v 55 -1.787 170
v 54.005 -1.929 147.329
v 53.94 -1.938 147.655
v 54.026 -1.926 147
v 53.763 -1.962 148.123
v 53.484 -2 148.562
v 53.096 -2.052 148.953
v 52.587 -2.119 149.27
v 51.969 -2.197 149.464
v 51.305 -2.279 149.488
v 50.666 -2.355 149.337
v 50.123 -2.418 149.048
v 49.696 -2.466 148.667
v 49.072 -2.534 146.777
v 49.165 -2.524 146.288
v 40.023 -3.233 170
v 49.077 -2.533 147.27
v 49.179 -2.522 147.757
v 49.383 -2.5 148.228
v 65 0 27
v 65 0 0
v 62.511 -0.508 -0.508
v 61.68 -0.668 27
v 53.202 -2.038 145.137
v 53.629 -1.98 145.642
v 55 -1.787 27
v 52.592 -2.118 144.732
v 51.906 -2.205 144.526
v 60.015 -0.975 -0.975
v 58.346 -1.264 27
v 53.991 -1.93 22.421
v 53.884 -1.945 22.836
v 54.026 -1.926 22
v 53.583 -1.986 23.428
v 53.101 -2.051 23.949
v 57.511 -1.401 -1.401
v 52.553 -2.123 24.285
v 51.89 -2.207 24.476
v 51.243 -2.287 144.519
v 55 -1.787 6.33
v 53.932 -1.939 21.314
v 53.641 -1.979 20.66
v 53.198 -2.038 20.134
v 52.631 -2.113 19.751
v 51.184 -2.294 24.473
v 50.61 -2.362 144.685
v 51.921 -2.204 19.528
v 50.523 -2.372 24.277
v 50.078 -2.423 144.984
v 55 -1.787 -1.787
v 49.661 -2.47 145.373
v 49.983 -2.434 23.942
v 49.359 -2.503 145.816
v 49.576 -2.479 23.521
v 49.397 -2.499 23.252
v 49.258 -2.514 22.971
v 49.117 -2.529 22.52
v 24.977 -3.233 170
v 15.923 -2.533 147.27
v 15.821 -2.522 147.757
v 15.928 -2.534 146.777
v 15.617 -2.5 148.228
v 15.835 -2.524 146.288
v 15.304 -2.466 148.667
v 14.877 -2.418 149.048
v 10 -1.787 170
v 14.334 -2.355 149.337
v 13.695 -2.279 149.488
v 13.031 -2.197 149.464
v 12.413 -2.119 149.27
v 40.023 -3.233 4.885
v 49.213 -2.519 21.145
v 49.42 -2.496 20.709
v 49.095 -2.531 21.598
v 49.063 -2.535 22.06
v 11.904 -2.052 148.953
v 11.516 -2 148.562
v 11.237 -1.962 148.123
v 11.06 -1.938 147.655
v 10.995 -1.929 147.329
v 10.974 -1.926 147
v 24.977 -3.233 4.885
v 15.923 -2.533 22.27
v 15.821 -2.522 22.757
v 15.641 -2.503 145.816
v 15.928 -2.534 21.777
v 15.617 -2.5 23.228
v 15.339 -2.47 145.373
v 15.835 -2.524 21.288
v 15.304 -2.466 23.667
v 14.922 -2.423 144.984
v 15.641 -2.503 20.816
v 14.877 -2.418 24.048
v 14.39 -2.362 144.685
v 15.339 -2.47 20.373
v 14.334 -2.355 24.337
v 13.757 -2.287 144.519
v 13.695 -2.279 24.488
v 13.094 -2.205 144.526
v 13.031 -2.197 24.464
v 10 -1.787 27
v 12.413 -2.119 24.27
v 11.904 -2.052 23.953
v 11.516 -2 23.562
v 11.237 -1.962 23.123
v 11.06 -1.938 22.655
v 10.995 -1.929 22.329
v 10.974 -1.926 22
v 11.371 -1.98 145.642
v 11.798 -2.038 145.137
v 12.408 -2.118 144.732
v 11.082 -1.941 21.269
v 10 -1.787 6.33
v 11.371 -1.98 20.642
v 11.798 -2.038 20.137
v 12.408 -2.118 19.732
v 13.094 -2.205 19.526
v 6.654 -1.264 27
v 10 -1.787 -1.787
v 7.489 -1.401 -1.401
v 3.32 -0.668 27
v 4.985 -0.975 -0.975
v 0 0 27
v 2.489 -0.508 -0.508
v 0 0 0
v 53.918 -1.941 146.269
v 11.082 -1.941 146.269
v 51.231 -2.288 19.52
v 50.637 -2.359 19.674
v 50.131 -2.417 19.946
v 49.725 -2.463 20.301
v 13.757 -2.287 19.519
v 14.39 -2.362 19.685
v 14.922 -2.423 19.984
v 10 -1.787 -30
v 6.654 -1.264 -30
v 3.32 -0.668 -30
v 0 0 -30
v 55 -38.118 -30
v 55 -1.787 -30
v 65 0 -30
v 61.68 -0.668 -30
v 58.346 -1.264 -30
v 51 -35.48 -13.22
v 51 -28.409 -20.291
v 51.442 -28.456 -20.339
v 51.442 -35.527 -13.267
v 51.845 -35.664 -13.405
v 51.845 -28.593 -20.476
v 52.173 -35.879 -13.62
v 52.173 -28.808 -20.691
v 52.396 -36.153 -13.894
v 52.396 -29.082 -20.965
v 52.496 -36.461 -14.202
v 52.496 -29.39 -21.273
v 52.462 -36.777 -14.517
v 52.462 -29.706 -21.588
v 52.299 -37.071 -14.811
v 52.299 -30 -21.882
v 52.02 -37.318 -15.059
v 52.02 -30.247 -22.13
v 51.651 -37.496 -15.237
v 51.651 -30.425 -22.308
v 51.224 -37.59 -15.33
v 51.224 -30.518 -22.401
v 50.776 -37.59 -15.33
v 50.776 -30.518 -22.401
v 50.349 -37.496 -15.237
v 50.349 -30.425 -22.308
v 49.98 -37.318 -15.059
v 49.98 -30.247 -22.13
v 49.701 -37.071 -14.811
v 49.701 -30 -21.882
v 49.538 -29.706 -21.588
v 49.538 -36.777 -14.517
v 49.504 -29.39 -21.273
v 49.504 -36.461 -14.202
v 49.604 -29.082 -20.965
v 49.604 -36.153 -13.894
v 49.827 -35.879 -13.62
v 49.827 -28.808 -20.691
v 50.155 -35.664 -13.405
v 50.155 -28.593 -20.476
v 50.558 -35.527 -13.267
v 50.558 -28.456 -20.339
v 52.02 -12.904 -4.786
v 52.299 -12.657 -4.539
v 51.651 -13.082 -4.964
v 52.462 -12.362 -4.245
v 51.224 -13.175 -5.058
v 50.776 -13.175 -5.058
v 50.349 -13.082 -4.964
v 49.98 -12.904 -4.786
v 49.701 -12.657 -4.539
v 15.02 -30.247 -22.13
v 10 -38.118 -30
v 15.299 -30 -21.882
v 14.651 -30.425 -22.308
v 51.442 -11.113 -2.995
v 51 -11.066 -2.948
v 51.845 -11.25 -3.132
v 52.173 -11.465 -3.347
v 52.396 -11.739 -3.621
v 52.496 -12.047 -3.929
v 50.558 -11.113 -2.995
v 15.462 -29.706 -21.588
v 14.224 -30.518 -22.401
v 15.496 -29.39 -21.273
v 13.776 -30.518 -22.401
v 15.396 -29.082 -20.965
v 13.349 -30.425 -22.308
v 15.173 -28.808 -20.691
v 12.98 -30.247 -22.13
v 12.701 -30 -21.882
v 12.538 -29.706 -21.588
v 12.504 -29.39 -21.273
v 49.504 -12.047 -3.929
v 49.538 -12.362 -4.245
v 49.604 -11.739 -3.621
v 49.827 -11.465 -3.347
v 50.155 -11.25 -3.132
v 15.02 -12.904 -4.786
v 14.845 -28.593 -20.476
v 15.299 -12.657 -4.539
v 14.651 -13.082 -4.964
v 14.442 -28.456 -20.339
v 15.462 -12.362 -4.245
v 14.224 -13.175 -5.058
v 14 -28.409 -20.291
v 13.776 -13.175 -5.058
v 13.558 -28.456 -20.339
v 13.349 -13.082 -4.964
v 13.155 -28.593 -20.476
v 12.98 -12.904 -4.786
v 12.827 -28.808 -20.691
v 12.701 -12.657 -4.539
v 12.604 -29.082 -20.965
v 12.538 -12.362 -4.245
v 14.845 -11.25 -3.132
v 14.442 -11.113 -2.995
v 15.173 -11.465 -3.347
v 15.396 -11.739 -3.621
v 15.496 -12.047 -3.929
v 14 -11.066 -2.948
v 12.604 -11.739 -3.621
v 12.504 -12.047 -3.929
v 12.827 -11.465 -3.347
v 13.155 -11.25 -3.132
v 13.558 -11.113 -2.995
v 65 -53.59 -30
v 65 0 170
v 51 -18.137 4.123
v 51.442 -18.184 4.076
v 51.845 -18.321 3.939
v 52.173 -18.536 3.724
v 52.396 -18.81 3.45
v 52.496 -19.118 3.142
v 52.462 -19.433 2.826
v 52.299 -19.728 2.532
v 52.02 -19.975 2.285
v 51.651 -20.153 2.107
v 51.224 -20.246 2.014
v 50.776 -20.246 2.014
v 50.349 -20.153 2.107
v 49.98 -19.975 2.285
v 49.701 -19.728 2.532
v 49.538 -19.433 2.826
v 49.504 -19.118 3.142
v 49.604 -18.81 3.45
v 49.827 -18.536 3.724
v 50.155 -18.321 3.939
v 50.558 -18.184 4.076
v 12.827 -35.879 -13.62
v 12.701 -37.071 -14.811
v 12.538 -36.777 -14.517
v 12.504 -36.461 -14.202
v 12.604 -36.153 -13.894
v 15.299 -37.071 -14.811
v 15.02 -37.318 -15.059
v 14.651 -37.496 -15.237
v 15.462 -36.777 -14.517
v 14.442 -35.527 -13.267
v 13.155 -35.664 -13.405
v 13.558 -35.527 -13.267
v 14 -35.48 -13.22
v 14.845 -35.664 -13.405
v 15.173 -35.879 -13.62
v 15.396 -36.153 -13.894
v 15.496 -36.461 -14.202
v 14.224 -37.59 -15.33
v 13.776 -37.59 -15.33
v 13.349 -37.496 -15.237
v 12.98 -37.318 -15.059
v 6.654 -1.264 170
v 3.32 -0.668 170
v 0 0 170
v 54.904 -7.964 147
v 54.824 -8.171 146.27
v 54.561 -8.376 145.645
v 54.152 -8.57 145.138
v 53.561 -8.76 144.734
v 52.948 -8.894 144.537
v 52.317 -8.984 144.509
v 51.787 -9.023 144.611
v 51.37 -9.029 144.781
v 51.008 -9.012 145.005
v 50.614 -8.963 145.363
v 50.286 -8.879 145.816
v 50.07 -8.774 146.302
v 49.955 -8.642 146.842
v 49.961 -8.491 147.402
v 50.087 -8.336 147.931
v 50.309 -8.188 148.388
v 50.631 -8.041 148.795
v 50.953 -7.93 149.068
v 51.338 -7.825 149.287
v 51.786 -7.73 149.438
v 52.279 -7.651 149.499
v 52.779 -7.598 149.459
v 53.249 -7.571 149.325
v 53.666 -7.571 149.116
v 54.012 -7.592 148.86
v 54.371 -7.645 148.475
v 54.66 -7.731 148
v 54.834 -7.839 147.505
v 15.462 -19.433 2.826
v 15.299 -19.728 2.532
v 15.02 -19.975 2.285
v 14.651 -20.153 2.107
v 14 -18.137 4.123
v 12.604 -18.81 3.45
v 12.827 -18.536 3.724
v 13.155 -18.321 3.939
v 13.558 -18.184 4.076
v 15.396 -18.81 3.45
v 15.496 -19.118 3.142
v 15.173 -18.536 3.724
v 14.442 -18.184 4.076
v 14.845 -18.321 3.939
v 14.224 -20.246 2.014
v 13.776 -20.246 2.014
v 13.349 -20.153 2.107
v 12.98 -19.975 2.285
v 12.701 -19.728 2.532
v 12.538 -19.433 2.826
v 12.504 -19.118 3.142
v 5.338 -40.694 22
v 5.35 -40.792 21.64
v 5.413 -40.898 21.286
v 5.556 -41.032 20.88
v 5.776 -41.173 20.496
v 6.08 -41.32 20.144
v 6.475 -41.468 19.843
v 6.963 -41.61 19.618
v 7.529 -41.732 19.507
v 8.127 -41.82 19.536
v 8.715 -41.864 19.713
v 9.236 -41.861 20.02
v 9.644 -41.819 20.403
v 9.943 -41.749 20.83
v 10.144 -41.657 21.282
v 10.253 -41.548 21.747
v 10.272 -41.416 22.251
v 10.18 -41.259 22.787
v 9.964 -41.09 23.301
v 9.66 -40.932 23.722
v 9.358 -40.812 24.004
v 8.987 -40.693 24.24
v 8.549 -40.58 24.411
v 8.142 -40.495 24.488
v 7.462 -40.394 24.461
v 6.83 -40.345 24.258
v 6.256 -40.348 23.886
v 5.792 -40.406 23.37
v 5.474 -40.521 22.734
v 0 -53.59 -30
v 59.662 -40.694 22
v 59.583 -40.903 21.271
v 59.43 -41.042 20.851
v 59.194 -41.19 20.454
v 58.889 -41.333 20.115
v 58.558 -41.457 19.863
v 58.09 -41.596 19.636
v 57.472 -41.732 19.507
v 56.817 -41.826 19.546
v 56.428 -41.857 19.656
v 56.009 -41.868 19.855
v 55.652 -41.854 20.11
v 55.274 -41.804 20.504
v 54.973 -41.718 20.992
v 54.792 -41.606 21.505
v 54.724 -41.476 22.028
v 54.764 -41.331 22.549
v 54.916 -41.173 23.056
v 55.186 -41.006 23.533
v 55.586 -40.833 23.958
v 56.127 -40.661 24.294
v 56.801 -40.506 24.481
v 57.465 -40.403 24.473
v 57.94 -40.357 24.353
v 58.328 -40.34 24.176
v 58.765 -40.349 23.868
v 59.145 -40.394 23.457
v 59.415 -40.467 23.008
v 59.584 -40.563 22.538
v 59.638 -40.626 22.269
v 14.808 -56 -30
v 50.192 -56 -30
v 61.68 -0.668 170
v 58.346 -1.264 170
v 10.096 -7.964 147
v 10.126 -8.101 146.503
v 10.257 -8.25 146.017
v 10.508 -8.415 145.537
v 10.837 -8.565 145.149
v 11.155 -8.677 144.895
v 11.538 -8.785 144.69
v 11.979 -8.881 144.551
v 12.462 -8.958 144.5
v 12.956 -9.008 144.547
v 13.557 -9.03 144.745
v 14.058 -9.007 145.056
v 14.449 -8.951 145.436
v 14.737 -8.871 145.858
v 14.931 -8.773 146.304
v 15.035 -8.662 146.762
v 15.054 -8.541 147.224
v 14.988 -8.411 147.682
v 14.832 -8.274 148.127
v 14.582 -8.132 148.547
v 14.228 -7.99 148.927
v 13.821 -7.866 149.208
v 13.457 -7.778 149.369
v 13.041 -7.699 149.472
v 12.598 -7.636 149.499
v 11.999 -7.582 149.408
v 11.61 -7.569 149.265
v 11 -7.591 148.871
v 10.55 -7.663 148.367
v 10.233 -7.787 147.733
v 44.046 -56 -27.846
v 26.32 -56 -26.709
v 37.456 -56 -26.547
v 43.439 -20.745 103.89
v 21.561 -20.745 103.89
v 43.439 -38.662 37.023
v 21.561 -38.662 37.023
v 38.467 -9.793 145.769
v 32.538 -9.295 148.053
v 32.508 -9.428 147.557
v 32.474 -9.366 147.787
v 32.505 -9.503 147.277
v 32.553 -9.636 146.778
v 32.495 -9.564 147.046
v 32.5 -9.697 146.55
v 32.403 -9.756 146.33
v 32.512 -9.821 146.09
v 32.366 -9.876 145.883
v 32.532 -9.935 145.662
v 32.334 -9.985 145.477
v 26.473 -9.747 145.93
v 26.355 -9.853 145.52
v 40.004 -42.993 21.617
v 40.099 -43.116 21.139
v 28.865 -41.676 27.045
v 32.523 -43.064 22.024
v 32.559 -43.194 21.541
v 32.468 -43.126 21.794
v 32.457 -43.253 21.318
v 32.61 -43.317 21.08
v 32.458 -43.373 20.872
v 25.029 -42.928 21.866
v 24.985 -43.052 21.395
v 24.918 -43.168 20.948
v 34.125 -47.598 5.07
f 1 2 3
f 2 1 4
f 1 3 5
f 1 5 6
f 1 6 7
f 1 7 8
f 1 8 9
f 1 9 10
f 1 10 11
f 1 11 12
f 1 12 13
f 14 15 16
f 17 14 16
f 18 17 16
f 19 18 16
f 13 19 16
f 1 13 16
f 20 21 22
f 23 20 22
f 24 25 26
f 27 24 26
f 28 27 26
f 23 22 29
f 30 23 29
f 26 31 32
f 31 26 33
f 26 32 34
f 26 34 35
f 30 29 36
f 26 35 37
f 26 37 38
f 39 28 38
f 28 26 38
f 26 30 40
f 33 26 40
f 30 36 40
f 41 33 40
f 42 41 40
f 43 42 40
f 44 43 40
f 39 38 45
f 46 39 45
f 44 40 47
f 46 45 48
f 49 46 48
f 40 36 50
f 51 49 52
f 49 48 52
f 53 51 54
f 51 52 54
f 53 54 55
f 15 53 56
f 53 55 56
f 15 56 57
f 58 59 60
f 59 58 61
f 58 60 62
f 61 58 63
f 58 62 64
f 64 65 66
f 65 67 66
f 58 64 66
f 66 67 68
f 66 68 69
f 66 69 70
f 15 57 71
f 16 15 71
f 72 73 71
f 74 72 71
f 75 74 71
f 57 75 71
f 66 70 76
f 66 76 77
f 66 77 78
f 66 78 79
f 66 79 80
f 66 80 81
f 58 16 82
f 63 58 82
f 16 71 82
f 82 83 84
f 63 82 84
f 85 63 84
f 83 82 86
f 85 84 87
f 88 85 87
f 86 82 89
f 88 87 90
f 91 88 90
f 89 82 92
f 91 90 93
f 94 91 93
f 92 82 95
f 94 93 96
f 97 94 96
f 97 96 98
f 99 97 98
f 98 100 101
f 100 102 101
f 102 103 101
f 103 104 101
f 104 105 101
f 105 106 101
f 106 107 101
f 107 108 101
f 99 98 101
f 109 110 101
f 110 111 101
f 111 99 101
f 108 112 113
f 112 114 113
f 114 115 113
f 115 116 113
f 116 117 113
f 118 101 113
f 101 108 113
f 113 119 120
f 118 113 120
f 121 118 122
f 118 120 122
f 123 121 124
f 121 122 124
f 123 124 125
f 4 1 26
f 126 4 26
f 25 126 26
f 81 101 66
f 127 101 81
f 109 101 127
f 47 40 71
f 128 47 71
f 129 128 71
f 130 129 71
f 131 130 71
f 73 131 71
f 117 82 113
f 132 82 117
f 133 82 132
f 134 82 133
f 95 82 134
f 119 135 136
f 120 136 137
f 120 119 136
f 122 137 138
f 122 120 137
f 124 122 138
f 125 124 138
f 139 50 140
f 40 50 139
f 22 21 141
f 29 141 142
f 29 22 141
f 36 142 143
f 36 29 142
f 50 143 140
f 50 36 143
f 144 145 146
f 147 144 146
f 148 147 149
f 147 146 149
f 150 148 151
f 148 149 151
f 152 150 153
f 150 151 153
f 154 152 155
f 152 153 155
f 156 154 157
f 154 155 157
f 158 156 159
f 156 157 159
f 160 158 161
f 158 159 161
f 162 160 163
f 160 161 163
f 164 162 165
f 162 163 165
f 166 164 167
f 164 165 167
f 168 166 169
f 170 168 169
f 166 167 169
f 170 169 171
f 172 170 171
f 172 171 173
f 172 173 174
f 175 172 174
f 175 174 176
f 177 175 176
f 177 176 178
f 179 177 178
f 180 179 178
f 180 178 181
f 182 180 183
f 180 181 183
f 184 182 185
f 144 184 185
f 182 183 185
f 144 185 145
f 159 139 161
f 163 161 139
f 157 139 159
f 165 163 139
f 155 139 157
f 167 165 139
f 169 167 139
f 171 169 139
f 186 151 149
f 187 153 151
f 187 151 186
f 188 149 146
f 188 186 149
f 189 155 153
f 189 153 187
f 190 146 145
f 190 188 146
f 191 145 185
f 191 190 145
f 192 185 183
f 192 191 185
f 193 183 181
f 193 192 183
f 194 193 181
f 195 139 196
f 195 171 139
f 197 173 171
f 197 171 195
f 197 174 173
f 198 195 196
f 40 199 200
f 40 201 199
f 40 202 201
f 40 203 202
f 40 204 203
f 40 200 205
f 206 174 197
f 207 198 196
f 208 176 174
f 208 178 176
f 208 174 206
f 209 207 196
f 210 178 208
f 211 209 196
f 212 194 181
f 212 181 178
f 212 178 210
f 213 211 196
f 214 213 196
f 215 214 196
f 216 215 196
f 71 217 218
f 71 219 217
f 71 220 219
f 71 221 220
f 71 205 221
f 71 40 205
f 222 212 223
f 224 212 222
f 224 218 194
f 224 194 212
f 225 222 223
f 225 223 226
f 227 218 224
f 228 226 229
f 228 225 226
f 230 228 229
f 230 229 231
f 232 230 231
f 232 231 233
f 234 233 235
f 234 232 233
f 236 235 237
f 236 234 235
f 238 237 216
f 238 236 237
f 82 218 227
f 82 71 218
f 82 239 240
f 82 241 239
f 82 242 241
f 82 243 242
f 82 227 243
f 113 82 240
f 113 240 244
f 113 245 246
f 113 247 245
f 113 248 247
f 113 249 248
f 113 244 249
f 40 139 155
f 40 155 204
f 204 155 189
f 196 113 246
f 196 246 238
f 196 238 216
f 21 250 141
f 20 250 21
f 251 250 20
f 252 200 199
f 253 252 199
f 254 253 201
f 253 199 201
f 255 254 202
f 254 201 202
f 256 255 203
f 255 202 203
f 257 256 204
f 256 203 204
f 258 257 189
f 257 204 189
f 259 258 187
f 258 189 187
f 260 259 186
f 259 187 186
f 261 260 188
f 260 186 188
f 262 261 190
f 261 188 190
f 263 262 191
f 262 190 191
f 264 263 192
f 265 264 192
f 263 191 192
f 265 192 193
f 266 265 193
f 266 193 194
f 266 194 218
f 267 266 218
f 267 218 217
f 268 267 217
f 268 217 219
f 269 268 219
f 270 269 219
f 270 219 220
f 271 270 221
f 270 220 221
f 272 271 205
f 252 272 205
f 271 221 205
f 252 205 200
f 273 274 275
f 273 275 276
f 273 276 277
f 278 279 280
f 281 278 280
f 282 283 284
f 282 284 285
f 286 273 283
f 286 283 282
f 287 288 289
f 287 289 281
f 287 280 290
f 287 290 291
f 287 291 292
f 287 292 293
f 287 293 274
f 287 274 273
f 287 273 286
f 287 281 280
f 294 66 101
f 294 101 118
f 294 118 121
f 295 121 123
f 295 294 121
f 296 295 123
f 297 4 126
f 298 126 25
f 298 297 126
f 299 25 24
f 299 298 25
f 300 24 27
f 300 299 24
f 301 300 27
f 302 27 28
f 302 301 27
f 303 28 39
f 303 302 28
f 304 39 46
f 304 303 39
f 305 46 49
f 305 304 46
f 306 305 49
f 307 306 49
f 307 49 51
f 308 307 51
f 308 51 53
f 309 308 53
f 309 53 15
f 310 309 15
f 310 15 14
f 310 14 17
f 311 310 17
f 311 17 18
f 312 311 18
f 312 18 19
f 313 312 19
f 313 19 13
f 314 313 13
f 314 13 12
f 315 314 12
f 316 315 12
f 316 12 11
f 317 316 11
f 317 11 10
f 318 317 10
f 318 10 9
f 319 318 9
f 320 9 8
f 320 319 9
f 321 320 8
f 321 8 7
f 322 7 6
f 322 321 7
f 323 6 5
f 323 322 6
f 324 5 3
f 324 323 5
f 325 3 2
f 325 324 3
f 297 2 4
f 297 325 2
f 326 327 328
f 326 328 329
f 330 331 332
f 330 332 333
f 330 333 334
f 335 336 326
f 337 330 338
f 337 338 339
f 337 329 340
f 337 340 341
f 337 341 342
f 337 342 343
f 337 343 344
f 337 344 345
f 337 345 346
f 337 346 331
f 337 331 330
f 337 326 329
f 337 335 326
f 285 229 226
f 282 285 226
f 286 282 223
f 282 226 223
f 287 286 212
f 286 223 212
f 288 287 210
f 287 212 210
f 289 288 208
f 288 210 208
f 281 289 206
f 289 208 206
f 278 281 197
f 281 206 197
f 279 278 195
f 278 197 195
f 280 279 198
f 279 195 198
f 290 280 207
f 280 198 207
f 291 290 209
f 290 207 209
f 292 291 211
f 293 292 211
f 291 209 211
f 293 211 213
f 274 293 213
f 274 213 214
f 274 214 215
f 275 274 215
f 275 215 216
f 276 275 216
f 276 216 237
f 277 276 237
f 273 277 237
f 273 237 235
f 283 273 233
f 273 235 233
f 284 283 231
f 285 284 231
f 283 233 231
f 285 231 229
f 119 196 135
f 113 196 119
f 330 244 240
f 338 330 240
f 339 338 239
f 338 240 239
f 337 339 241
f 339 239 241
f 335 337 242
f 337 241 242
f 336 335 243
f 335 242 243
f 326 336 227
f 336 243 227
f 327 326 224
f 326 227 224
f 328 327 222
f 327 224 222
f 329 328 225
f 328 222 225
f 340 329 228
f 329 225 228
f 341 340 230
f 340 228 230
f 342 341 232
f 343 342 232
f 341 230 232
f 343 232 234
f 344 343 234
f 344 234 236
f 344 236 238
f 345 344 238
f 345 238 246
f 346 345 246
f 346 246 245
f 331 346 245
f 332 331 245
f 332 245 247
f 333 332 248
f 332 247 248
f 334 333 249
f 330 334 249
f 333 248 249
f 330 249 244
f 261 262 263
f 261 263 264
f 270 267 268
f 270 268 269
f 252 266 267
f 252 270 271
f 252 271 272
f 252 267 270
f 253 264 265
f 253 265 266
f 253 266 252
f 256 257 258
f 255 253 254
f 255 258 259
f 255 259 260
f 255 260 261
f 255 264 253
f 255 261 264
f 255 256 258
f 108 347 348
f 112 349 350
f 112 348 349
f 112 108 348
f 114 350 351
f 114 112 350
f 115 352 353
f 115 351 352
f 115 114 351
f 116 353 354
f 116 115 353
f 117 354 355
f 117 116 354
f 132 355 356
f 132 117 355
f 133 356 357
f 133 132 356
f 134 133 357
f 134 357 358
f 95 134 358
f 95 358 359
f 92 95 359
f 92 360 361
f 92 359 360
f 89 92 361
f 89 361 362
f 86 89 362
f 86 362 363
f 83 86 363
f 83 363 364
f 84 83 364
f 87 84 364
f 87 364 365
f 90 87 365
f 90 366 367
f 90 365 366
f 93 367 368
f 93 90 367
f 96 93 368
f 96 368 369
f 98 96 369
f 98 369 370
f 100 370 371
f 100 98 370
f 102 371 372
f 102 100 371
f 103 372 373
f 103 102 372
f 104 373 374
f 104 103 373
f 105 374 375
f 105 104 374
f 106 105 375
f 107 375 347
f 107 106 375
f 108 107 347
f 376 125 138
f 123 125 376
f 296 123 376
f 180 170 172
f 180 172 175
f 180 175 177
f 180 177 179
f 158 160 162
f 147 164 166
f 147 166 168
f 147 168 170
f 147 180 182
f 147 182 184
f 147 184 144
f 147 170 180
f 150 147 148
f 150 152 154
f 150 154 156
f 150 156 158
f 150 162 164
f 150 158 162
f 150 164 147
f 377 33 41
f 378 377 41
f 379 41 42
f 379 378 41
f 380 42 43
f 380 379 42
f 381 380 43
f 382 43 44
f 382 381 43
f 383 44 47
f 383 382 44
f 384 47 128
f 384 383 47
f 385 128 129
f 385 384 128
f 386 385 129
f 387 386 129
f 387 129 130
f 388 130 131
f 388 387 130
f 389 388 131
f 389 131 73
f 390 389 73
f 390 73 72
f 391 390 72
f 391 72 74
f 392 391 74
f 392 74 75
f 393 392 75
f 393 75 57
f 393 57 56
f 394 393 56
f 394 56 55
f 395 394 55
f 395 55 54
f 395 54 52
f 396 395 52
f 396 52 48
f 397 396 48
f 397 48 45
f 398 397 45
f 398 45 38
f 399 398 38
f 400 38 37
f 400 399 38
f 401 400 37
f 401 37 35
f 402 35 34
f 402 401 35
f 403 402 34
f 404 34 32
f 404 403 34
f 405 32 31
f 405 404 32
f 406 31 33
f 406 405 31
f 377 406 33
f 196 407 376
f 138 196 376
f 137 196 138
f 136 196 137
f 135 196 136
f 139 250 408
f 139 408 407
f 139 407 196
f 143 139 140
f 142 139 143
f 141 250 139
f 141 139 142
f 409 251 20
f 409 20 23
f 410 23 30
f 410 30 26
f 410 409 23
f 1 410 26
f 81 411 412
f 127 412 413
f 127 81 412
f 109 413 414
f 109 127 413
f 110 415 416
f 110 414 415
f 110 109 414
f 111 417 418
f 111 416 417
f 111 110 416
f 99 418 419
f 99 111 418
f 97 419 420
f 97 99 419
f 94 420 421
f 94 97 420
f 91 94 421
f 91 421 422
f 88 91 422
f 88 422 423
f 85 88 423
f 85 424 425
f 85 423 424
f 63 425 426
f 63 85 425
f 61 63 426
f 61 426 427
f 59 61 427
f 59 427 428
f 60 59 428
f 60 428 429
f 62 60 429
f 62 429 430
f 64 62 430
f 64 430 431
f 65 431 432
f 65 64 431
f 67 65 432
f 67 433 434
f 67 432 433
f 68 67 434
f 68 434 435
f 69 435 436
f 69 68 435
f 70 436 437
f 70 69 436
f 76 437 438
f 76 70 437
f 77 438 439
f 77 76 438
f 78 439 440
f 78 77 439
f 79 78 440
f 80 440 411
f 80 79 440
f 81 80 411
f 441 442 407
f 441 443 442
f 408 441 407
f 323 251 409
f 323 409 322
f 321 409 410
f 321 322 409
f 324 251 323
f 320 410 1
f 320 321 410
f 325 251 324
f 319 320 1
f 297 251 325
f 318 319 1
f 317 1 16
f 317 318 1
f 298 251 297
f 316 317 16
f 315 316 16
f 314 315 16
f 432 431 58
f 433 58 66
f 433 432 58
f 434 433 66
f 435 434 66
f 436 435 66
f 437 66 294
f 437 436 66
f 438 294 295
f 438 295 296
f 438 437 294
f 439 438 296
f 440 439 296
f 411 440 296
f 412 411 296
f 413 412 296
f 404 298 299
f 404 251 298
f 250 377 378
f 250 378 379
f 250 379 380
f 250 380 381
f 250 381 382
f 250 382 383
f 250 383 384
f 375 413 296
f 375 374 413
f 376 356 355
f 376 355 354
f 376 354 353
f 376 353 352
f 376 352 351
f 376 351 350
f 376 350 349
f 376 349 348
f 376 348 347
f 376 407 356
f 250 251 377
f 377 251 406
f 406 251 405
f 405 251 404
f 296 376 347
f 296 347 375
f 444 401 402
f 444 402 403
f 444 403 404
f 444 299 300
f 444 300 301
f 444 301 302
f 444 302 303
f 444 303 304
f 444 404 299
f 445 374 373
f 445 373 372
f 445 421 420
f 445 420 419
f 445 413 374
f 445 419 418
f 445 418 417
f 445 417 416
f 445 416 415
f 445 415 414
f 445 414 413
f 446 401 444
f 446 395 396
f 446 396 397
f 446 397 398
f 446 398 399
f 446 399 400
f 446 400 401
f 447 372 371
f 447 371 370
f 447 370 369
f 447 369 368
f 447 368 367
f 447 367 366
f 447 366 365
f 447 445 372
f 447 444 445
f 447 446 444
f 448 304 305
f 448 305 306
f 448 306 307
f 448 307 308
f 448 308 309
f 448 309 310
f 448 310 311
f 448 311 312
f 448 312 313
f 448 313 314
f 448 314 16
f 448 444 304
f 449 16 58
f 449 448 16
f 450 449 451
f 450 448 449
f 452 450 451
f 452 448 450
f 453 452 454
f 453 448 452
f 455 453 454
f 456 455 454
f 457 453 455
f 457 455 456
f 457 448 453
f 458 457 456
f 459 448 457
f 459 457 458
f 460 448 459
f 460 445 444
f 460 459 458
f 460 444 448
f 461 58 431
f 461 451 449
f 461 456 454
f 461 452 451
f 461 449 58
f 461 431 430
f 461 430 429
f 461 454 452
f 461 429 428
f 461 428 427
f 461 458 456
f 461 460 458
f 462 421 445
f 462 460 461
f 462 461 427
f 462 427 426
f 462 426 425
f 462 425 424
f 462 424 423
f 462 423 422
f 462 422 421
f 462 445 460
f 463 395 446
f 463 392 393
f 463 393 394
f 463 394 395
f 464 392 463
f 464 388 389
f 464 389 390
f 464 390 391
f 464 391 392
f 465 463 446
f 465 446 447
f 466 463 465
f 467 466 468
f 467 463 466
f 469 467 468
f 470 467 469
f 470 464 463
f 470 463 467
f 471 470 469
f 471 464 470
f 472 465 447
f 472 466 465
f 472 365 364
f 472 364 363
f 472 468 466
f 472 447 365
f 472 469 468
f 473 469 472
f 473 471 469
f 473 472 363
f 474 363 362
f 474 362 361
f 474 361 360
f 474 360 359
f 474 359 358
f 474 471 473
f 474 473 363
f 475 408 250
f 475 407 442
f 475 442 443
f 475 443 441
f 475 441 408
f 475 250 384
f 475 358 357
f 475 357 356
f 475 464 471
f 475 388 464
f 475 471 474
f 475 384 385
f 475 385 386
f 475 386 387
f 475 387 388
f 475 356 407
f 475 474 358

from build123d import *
from build123d.topology import SkipClean

# Parameters (mm, degrees)
BOSS_EXTRUDE1_DEPTH     = 27
BOSS_EXTRUDE2_DEPTH     = 65
CUT_EXTRUDE1_DEPTH      = 91.890043459
FILLET1_R               = 1
BOSS_EXTRUDE3_REACH     = 104.243
CUT_EXTRUDE2_REACH      = 104.243
BOSS_EXTRUDE4_REACH     = 92.026
BOSS_EXTRUDE5_DEPTH     = 65
SKETCH14_R              = 1.5
CUT_EXTRUDE7_DEPTH      = 5
CUT_EXTRUDE9_DEPTH      = 105.630301538
CUT_EXTRUDE9_DEPTH_BACK = 105.630301538
SKETCH15_W              = 45
SKETCH15_H              = 5.74
SKETCH16_R              = 1.5
CUT_EXTRUDE10_DEPTH     = 10
FILLET4_R               = 23
BOSS_EXTRUDE7_REACH     = 219.626
CUT_EXTRUDE5_DEPTH      = 184.620949427
CUT_EXTRUDE5_DEPTH_BACK = 184.620949427
SKETCH11_R              = 2.5
CUT_EXTRUDE6_DEPTH      = 186.847147779
CUT_EXTRUDE6_DEPTH_BACK = 186.847147779
SKETCH12_R              = 2.5
CUT_SWEEP1_START        = -43.471641414
CUT_SWEEP1_DEPTH        = 207.679031883


# Read off the part's stored shape, not the designer's step: Cut-Sweep1
with BuildPart() as part:
    # Sketch1 → Boss-Extrude1 (new body)
    with BuildSketch(Plane.XY):
        with BuildLine():
            Line((0, 0), (0, -26))
            ThreePointArc((0, -26), (32.5, -29.41402025), (65, -26))
            Line((65, -26), (65, 0))
            ThreePointArc((65, 0), (32.5, -3.41402025), (0, 0))
        make_face()
    extrude(amount=BOSS_EXTRUDE1_DEPTH)

    # Sketch4 → Boss-Extrude2 (add)
    with BuildSketch(Plane(origin=(65, 0, 0), x_dir=(0, 0, -1), z_dir=(1, 0, 0))):
        Polygon((0, -26), (30, -56), (30, -30), (0, 0), align=None)
    extrude(amount=-BOSS_EXTRUDE2_DEPTH)

    # Sketch5 → Cut-Extrude1 (cut, through all)
    with BuildSketch(Plane.XY):
        with BuildLine():
            Line((65, 0), (0, 0))
            ThreePointArc((0, 0), (32.5, -3.41402025), (65, 0))
        make_face()
    extrude(amount=-CUT_EXTRUDE1_DEPTH, mode=Mode.SUBTRACT)

    # Fillet1
    fillet1_edges = [part.edges().sort_by_distance(p)[0] for p in [
        (32.5, -56, -30),
    ]]
    fillet(fillet1_edges, radius=FILLET1_R)

    # Boss-Extrude3: up to this face of the body (flat: up to its plane)
    boss_extrude3_end = Plane(part.part.faces().sort_by_distance((32.5, -41.792893219, -30))[0])
    # Sketch6 → Boss-Extrude3 (add, up to the picked face)
    with BuildSketch(Plane.XY.offset(27), mode=Mode.PRIVATE) as boss_extrude3_sk1:
        with BuildLine():
            ThreePointArc((0, -26), (4.985486693, -26.974767058), (10, -27.787112227))
            Line((10, -27.787112227), (10, -1.787112227))
            ThreePointArc((10, -1.787112227), (4.985486693, -0.974767058), (0, 0))
            Line((0, 0), (0, -26))
        make_face()
    boss_extrude3_tool1 = split(extrude(boss_extrude3_sk1.sketch, amount=-BOSS_EXTRUDE3_REACH, mode=Mode.PRIVATE), bisect_by=boss_extrude3_end, keep=Keep.BOTH, mode=Mode.PRIVATE)
    # Sketch6 → Boss-Extrude3 (add, up to the picked face)
    with BuildSketch(Plane.XY.offset(27), mode=Mode.PRIVATE) as boss_extrude3_sk2:
        with BuildLine():
            Line((55, -1.787112227), (55, -27.787112227))
            ThreePointArc((55, -27.787112227), (60.014513307, -26.974767058), (65, -26))
            Line((65, -26), (65, 0))
            ThreePointArc((65, 0), (60.014513307, -0.974767058), (55, -1.787112227))
        make_face()
    boss_extrude3_tool2 = split(extrude(boss_extrude3_sk2.sketch, amount=-BOSS_EXTRUDE3_REACH, mode=Mode.PRIVATE), bisect_by=boss_extrude3_end, keep=Keep.BOTH, mode=Mode.PRIVATE)
    # Sketch6 → Boss-Extrude3 (add, up to the picked face)
    with BuildSketch(Plane.XY.offset(27), mode=Mode.PRIVATE) as boss_extrude3_sk3:
        with BuildLine():
            Line((10, -54.292893219), (10, -27.787112227))
            ThreePointArc((10, -27.787112227), (4.985486693, -26.974767058), (0, -26))
            Line((0, -26), (0, -54.292893219))
            Line((0, -54.292893219), (10, -54.292893219))
        make_face()
    boss_extrude3_tool3 = split(extrude(boss_extrude3_sk3.sketch, amount=-BOSS_EXTRUDE3_REACH, mode=Mode.PRIVATE), bisect_by=boss_extrude3_end, keep=Keep.BOTH, mode=Mode.PRIVATE)
    # Sketch6 → Boss-Extrude3 (add, up to the picked face)
    with BuildSketch(Plane.XY.offset(27), mode=Mode.PRIVATE) as boss_extrude3_sk4:
        with BuildLine():
            ThreePointArc((65, -26), (60.014513307, -26.974767058), (55, -27.787112227))
            Line((55, -27.787112227), (55, -54.292893219))
            Line((55, -54.292893219), (65, -54.292893219))
            Line((65, -54.292893219), (65, -26))
        make_face()
    boss_extrude3_tool4 = split(extrude(boss_extrude3_sk4.sketch, amount=-BOSS_EXTRUDE3_REACH, mode=Mode.PRIVATE), bisect_by=boss_extrude3_end, keep=Keep.BOTH, mode=Mode.PRIVATE)
    add(boss_extrude3_tool1.solids().sort_by(Axis((5, -13.949429, 27), (0, 0, -1)))[0])
    add(boss_extrude3_tool2.solids().sort_by(Axis((60, -13.949429, 27), (0, 0, -1)))[0])
    add(boss_extrude3_tool3.solids().sort_by(Axis((4.945547, -40.616285, 27), (0, 0, -1)))[0])
    add(boss_extrude3_tool4.solids().sort_by(Axis((60.054453, -40.616285, 27), (0, 0, -1)))[0])

    # Cut-Extrude2: up to this plane
    cut_extrude2_end = Plane(origin=(-63.529520697, -13, 13), z_dir=(0, -0.7071067811865562, 0.7071067811865389))
    # Sketch7 → Cut-Extrude2 (cut, up to the surface)
    with BuildSketch(Plane.XY.offset(27), mode=Mode.PRIVATE) as cut_extrude2_sk1:
        with BuildLine():
            ThreePointArc((10, -27.787112227), (4.985486693, -26.974767058), (0, -26))
            Line((0, -26), (0, -54.292893219))
            Line((0, -54.292893219), (10, -54.292893219))
            Line((10, -54.292893219), (10, -27.787112227))
        make_face()
    cut_extrude2_tool1 = split(extrude(cut_extrude2_sk1.sketch, amount=-CUT_EXTRUDE2_REACH, mode=Mode.PRIVATE), bisect_by=cut_extrude2_end, keep=Keep.BOTH, mode=Mode.PRIVATE)
    add(cut_extrude2_tool1.solids().sort_by_distance((4.945547, -40.616285, 27))[0], mode=Mode.SUBTRACT)
    # Sketch7 → Cut-Extrude2 (cut, up to the surface)
    with BuildSketch(Plane.XY.offset(27), mode=Mode.PRIVATE) as cut_extrude2_sk2:
        with BuildLine():
            Line((65, -54.292893219), (65, -26))
            ThreePointArc((65, -26), (60.014513307, -26.974767058), (55, -27.787112227))
            Line((55, -27.787112227), (55, -54.292893219))
            Line((55, -54.292893219), (65, -54.292893219))
        make_face()
    cut_extrude2_tool2 = split(extrude(cut_extrude2_sk2.sketch, amount=-CUT_EXTRUDE2_REACH, mode=Mode.PRIVATE), bisect_by=cut_extrude2_end, keep=Keep.BOTH, mode=Mode.PRIVATE)
    add(cut_extrude2_tool2.solids().sort_by_distance((60.054453, -40.616285, 27))[0], mode=Mode.SUBTRACT)

    # Boss-Extrude4: up to this face of the body (flat: up to its plane)
    boss_extrude4_end = Plane(part.part.faces().sort_by_distance((32.5, -40.28761869, -14.28761869))[0])
    # Sketch8 → Boss-Extrude4 (add, up to the picked face)
    with BuildSketch(Plane(origin=(0, 0, 0), x_dir=(-1, 0, 0), z_dir=(0, 0, -1)), mode=Mode.PRIVATE) as boss_extrude4_sk1:
        with BuildLine():
            Line((-55, -26), (-55, -27.787112227))
            ThreePointArc((-55, -27.787112227), (-32.5, -29.41402025), (-10, -27.787112227))
            Line((-10, -27.787112227), (-10, -26))
            Line((-10, -26), (-55, -26))
        make_face()
    boss_extrude4_tool1 = split(extrude(boss_extrude4_sk1.sketch, amount=BOSS_EXTRUDE4_REACH, mode=Mode.PRIVATE), bisect_by=boss_extrude4_end, keep=Keep.BOTH, mode=Mode.PRIVATE)
    add(boss_extrude4_tool1.solids().sort_by(Axis((32.5, -27.477312, 0), (0, 0, -1)))[0])

    # Sketch9 → Boss-Extrude5 (add)
    with BuildSketch(Plane.ZY):
        Polygon((-30, -51), (-25, -51), (-30, -56), align=None)
    extrude(amount=-BOSS_EXTRUDE5_DEPTH)

    # Sketch14 → Cut-Extrude7 (cut)
    with SkipClean():  # the faces are left unmerged after this step: merging them gives an invalid solid
        with BuildSketch(Plane(origin=(0, 0, 0), x_dir=(1, 0, 0), z_dir=(0, 0.7071067811865561, -0.7071067811865389))):
            with Locations(Location((14, 35.887280306, 0), (0, 0, 270))):
                Circle(SKETCH14_R)
            with Locations(Location((51, 35.887280306, 0), (0, 0, 270))):
                Circle(SKETCH14_R)
            with Locations(Location((51, 11.367280306, 0), (0, 0, 90))):
                Circle(SKETCH14_R)
            with Locations(Location((14, 11.367280306, 0), (0, 0, 90))):
                Circle(SKETCH14_R)
        extrude(amount=-CUT_EXTRUDE7_DEPTH, mode=Mode.SUBTRACT)

    # Sketch15 → Cut-Extrude9 (cut, two sides: drawn at the far end of the back side and taken through both)
    with SkipClean():  # the faces are left unmerged after this step: merging them gives an invalid solid
        with BuildSketch(Plane(origin=(0, 13.5, 13.5), x_dir=(-1, 0, 0), z_dir=(0, -0.7071067811865389, -0.7071067811865561)).offset(-CUT_EXTRUDE9_DEPTH_BACK)):
            with Locations((-32.5, -2.87)):
                Rectangle(SKETCH15_W, SKETCH15_H)
        extrude(amount=CUT_EXTRUDE9_DEPTH + CUT_EXTRUDE9_DEPTH_BACK, mode=Mode.SUBTRACT)

    # Sketch16 → Cut-Extrude10 (cut)
    with SkipClean():  # the faces are left unmerged after this step: merging them gives an invalid solid
        with BuildSketch(Plane(origin=(0, -4.058792924, 4.058792924), x_dir=(1, 0, 0), z_dir=(0, 0.7071067811865562, -0.7071067811865389))):
            with Locations(Location((14, 35.936406871, 0), (0, 0, 270))):
                Circle(SKETCH16_R)
            with Locations(Location((51, 35.936406871, 0), (0, 0, 270))):
                Circle(SKETCH16_R)
            with Locations(Location((14, 11.409221552, 0), (0, 0, 270))):
                Circle(SKETCH16_R)
            with Locations(Location((51, 11.409221552, 0), (0, 0, 270))):
                Circle(SKETCH16_R)
        extrude(amount=-CUT_EXTRUDE10_DEPTH, mode=Mode.SUBTRACT)

    # Fillet4
    fillet4_edges = [part.edges().sort_by_distance(p)[0] for p in [
        (32.5, -29.41402025, -3.41402025),
    ]]
    fillet(fillet4_edges, radius=FILLET4_R)

    # Boss-Extrude7: up to this face of the body (flat: up to its plane)
    boss_extrude7_end = Plane(part.part.faces().sort_by_distance((32.499999985, -45.563204914, -19.563204914))[0])
    # Sketch24 → Boss-Extrude7 (add, up to the picked face)
    with BuildSketch(Plane.XY.offset(170), mode=Mode.PRIVATE) as boss_extrude7_sk1:
        with BuildLine():
            Line((65, -56), (65, 0))
            ThreePointArc((65, 0), (60.014513307, -0.974767058), (55, -1.787112227))
            ThreePointArc((55, -1.787112227), (32.5, -3.41402025), (10, -1.787112227))
            ThreePointArc((10, -1.787112227), (4.985486693, -0.974767058), (0, 0))
            Line((0, 0), (0, -56))
            Line((0, -56), (65, -56))
        make_face()
    boss_extrude7_tool1 = split(extrude(boss_extrude7_sk1.sketch, amount=-BOSS_EXTRUDE7_REACH, mode=Mode.PRIVATE), bisect_by=boss_extrude7_end, keep=Keep.BOTH, mode=Mode.PRIVATE)
    add(boss_extrude7_tool1.solids().sort_by(Axis((32.5, -29.130902, 170), (0, 0, -1)))[0])

    # Sketch11 → Cut-Extrude5 (cut, two sides: drawn at the far end of the back side and taken through both)
    with BuildSketch(Plane(origin=(5.094217018, -35.042120851, 0), x_dir=(-0.9895977747865052, -0.14386189258312035, 0), z_dir=(-0.14386189258312035, 0.9895977747865053, 0)).offset(-CUT_EXTRUDE5_DEPTH_BACK)):
        with Locations(Location((-50.687468406, 22, 0), (0, 0, 180))):
            Circle(SKETCH11_R)
        with Locations(Location((-50.687468406, 147, 0), (0, 0, 180))):
            Circle(SKETCH11_R)
    extrude(amount=CUT_EXTRUDE5_DEPTH + CUT_EXTRUDE5_DEPTH_BACK, mode=Mode.SUBTRACT)

    # Sketch12 → Cut-Extrude6 (cut, two sides: drawn at the far end of the back side and taken through both)
    with BuildSketch(Plane(origin=(-3.74896115, -25.788369281, 0), x_dir=(0.9895977747865055, -0.14386189258311885, 0), z_dir=(-0.14386189258311885, -0.9895977747865056, 0)).offset(-CUT_EXTRUDE6_DEPTH_BACK)):
        with Locations(Location((13.636386955, 22, 0), (0, 0, 180))):
            Circle(SKETCH12_R)
        with Locations(Location((13.636386955, 147, 0), (0, 0, 180))):
            Circle(SKETCH12_R)
    extrude(amount=CUT_EXTRUDE6_DEPTH + CUT_EXTRUDE6_DEPTH_BACK, mode=Mode.SUBTRACT)

    # Cut-Sweep1 outline → Cut-Sweep1 (cut)
    with BuildSketch(Plane(origin=(0, 0, 0), x_dir=(1, 0, 0), z_dir=(0, 0.2588190451025179, 0.9659258262890691)).offset(CUT_SWEEP1_START)):
        with BuildLine():
            Line((65, -100), (65, -43.999237667))
            add(Edge.make_bspline(
                [(65, -43.999237667), (43.493313707, -48.412390901), (21.506686293, -48.412390901), (0, -43.999237667)],
                knots=[0, 0, 0, 0, 1, 1, 1, 1], degree=3, weights=[1, 0.985447484, 0.985447484, 1]))
            Line((0, -43.999237667), (0, -100))
            Line((0, -100), (65, -100))
        make_face()
    extrude(amount=CUT_SWEEP1_DEPTH, mode=Mode.SUBTRACT)


solid = part.part
